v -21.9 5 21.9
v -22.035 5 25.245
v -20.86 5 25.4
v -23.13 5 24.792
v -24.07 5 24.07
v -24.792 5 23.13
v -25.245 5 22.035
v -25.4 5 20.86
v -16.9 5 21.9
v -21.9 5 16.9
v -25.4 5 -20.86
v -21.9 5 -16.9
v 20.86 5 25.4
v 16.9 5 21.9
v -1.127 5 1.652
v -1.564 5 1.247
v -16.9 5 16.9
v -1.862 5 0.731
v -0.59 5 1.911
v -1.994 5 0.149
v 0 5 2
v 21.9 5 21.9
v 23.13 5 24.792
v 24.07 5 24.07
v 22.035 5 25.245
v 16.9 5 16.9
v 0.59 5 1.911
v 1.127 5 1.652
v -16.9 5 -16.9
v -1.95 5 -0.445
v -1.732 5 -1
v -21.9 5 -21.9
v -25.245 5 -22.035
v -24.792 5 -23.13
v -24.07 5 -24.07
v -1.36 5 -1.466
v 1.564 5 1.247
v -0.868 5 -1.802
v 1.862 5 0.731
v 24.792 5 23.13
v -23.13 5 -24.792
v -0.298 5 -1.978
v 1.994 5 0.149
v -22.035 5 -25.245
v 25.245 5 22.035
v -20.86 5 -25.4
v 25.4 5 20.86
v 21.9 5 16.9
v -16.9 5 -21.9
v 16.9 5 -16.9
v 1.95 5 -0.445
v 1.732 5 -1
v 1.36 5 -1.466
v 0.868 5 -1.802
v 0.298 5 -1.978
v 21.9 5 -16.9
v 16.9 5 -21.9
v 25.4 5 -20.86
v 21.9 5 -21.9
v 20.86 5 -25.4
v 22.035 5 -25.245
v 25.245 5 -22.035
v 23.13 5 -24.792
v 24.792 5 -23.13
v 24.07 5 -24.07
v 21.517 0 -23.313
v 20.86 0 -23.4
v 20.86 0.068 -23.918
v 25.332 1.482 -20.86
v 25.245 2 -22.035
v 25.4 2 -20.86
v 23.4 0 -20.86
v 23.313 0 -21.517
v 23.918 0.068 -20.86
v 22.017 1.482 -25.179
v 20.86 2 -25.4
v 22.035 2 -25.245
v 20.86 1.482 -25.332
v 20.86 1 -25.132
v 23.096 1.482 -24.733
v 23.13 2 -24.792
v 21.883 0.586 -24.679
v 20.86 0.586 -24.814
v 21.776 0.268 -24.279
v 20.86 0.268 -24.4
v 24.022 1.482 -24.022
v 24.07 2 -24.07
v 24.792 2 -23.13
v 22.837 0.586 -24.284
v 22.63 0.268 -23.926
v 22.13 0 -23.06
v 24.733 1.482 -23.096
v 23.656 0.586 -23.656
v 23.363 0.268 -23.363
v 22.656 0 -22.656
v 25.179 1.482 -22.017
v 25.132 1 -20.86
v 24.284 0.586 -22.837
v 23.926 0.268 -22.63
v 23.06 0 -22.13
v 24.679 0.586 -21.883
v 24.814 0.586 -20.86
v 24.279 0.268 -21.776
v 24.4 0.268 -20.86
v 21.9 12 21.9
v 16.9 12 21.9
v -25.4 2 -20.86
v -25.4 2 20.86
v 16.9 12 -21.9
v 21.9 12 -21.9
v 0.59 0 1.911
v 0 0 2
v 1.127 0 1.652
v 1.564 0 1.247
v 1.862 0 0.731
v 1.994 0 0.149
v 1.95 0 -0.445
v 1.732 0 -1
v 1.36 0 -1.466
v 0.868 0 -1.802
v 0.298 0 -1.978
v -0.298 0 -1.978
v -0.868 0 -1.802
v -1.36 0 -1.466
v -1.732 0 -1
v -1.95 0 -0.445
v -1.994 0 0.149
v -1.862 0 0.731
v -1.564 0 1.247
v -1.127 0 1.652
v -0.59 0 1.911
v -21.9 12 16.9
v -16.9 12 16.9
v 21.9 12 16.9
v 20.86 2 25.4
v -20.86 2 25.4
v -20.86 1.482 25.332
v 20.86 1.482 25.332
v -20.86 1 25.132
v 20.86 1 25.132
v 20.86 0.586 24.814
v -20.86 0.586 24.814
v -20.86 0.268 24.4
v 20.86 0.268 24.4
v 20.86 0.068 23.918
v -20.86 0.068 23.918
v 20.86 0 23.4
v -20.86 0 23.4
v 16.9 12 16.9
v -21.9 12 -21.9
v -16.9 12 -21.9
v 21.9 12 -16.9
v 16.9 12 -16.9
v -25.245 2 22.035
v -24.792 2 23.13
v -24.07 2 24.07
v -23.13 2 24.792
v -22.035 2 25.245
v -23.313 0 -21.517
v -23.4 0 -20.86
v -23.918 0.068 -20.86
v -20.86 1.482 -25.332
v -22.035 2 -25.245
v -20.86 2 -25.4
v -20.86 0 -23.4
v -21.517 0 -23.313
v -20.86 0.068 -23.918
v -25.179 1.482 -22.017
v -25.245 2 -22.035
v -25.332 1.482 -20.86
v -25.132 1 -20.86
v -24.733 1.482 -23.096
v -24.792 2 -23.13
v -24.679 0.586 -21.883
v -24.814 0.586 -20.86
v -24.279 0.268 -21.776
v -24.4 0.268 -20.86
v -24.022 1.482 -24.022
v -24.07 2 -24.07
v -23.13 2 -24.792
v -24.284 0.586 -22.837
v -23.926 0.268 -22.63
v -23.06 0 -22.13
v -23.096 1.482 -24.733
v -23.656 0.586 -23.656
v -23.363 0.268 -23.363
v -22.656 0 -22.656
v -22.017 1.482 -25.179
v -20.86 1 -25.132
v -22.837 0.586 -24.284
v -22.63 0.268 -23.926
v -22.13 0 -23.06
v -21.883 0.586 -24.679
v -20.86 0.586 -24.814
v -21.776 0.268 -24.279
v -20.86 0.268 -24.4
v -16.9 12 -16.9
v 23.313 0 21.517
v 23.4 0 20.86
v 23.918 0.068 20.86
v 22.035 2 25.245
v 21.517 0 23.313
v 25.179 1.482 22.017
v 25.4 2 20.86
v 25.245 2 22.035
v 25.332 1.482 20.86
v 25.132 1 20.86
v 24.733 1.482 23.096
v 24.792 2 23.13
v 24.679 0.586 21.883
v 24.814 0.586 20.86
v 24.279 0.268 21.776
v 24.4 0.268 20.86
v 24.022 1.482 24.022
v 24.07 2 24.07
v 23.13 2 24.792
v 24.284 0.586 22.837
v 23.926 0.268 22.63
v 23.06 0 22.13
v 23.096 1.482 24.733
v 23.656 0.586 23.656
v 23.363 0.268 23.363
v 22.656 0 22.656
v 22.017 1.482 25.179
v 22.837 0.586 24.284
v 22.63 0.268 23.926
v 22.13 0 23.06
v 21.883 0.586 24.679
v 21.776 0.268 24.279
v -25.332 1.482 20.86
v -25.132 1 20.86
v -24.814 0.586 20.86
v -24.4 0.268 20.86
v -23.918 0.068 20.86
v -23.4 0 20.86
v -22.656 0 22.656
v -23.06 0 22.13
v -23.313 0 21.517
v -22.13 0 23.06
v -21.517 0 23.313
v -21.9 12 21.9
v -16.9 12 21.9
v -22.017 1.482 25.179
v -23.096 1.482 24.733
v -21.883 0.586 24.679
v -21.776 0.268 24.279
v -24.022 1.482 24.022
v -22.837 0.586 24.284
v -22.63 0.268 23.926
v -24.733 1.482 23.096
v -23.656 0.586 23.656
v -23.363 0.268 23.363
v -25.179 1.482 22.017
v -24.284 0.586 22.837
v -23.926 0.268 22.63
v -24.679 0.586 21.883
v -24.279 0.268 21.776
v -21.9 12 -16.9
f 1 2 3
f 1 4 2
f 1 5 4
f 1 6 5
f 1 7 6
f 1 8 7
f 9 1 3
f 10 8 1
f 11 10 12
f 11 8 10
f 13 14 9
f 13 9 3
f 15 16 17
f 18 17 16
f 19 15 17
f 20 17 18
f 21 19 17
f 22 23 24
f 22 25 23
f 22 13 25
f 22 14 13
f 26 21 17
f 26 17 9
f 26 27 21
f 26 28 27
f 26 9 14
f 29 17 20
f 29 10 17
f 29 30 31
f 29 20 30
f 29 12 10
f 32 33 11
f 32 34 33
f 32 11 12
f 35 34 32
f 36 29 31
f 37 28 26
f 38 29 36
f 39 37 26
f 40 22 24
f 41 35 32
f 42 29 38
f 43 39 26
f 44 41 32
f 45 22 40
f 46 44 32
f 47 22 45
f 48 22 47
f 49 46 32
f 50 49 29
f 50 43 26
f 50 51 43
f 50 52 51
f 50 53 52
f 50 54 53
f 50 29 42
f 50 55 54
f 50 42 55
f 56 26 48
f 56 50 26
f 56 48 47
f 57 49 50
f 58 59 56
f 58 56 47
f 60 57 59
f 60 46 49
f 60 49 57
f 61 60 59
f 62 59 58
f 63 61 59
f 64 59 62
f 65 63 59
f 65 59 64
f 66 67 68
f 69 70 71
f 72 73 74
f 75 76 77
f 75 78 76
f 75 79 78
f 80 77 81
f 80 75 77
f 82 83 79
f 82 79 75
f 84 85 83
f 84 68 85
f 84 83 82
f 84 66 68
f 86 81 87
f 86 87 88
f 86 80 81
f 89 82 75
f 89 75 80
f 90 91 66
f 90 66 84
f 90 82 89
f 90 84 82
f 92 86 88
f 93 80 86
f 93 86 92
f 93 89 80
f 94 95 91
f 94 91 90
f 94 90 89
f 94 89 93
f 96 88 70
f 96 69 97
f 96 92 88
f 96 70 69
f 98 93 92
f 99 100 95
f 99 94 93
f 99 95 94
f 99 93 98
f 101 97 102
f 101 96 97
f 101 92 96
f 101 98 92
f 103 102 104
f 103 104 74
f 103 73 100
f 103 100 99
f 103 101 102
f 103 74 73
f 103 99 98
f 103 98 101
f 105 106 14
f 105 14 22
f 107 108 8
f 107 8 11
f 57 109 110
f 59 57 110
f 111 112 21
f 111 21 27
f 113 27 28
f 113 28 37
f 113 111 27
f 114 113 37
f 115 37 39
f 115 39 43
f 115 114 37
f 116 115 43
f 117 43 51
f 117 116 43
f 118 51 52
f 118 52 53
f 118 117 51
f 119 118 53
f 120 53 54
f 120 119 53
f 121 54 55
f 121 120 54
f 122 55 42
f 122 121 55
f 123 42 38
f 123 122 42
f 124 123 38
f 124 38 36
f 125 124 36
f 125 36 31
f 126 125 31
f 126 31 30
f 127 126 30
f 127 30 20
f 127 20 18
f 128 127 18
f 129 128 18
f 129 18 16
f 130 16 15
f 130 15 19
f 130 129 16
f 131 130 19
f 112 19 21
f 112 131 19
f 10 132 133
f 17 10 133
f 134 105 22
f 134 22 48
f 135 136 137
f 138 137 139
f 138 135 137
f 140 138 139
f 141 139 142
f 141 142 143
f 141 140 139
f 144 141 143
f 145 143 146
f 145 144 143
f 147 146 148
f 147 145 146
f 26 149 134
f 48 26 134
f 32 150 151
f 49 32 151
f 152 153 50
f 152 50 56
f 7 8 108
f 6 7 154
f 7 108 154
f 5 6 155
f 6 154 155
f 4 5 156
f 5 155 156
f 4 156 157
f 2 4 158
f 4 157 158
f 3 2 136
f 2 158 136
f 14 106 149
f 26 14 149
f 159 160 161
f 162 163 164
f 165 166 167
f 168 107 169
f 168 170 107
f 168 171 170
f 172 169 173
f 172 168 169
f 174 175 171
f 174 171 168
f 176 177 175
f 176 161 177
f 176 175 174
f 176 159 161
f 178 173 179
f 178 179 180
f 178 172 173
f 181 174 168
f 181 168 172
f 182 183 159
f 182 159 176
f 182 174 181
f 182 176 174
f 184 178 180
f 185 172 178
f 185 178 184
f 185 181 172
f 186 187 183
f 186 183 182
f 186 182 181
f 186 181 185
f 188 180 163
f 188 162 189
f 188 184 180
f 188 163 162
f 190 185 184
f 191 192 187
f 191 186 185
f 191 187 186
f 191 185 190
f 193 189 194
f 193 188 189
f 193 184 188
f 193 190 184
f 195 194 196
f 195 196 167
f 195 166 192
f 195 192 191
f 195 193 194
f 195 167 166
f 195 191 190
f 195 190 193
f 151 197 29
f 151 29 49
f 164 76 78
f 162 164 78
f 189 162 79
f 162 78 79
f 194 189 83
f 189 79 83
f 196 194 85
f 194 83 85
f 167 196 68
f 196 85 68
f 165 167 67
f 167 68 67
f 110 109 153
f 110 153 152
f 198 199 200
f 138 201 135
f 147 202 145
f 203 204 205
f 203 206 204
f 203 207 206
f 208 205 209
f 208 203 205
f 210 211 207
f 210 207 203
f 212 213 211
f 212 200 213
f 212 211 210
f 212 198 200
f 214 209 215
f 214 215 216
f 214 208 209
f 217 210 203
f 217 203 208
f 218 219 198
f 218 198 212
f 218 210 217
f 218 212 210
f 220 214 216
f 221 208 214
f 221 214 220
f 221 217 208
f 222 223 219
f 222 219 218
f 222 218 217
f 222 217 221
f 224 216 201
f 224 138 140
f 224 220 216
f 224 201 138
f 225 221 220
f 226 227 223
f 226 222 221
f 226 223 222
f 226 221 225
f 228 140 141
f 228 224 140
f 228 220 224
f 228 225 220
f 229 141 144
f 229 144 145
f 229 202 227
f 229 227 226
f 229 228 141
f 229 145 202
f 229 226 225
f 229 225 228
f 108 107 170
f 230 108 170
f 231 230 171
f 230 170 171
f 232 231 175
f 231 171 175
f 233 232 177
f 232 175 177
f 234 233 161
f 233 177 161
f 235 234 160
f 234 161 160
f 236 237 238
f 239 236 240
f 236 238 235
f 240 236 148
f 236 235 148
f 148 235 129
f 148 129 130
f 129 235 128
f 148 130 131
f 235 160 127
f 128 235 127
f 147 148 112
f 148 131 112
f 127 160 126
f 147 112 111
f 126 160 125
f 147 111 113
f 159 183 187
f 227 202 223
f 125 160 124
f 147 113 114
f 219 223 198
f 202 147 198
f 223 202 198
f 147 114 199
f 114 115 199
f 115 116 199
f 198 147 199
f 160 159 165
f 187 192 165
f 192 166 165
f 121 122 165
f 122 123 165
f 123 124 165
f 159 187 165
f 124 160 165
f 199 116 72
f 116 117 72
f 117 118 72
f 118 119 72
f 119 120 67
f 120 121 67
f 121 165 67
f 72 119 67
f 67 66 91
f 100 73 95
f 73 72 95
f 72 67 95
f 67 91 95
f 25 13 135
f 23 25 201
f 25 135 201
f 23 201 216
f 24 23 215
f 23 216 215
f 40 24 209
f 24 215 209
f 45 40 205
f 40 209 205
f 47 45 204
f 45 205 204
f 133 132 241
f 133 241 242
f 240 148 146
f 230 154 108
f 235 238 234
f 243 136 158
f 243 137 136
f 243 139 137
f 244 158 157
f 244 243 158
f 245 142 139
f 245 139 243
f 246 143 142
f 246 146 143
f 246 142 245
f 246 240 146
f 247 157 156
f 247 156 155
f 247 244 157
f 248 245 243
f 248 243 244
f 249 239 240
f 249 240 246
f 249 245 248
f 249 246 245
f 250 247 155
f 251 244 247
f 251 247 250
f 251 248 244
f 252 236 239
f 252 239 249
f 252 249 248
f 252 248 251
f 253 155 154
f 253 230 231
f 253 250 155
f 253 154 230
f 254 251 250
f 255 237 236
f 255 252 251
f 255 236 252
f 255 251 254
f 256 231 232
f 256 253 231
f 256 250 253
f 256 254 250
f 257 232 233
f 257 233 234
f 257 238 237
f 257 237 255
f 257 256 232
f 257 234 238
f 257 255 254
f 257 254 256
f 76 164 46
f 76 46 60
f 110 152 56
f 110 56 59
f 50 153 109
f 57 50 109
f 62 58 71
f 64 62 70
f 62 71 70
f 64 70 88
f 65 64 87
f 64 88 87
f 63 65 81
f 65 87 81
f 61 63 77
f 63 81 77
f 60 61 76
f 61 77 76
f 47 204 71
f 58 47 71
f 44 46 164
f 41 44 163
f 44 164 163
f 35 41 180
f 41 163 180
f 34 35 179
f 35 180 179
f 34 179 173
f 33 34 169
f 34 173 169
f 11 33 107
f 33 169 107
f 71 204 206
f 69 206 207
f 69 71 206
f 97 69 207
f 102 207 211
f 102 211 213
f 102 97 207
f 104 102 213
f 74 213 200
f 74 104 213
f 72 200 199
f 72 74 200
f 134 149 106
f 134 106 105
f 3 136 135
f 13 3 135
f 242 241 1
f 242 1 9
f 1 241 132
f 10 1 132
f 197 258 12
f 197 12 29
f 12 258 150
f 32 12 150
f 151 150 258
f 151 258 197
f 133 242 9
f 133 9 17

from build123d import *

# Parameters (mm, degrees)
SKETCH1_W           = 50.8
SKETCH1_H           = 50.8
SKETCH1_R           = 2
SKETCH1_W_2         = 5
SKETCH1_H_2         = 5
BOSS_EXTRUDE1_DEPTH = 5
FILLET1_R           = 2
FILLET2_R           = 4.54
SKETCH1_6_W         = 5
SKETCH1_6_H         = 5
BOSS_EXTRUDE2_DEPTH = 12


with BuildPart() as part:
    # Sketch1 → Boss-Extrude1 (new body)
    with BuildSketch(Plane(origin=(0, 0, 0), x_dir=(1, 0, 0), z_dir=(0, 1, 0))):
        Rectangle(SKETCH1_W, SKETCH1_H)
        with Locations(Location((0, 0, 0), (0, 0, 270))):
            Circle(SKETCH1_R, mode=Mode.SUBTRACT)
        with Locations((-19.4, 19.4)):
            Rectangle(SKETCH1_W_2, SKETCH1_H_2, mode=Mode.SUBTRACT)
        with Locations((19.4, 19.4)):
            Rectangle(SKETCH1_W_2, SKETCH1_H_2, mode=Mode.SUBTRACT)
        with Locations((-19.4, -19.4)):
            Rectangle(SKETCH1_W_2, SKETCH1_H_2, mode=Mode.SUBTRACT)
        with Locations((19.4, -19.4)):
            Rectangle(SKETCH1_W_2, SKETCH1_H_2, mode=Mode.SUBTRACT)
    extrude(amount=BOSS_EXTRUDE1_DEPTH)

    # Fillet1
    fillet1_edges = [part.edges().sort_by_distance(p)[0] for p in [
        (0, 0, 25.4),
        (-25.4, 0, 0),
        (0, 0, -25.4),
        (25.4, 0, 0),
    ]]
    fillet(fillet1_edges, radius=FILLET1_R)

    # Fillet2
    # the kernel refuses this fillet: 4.54 mm, written as the material it takes off along each edge
    with BuildSketch(Plane(origin=(20.86, 0, -20.86), x_dir=(0, 0, -1), z_dir=(-1, 0, 0))) as fillet2_piece_1:
        with BuildLine():
            CenterArc((2.54, -2), 2, 0, 90)
            Line((4.54, -2), (4.54, 0))
            Line((4.54, 0), (2.54, 0))
        make_face()
    revolve(axis=Axis((20.86, 0, -20.86), (0, -1, 0)), revolution_arc=90, mode=Mode.SUBTRACT)
    with BuildSketch(Plane(origin=(20.86, 0, 20.86), x_dir=(1, 0, 0), z_dir=(0, 0, -1))) as fillet2_piece_2:
        with BuildLine():
            CenterArc((2.54, -2), 2, 0, 90)
            Line((4.54, -2), (4.54, 0))
            Line((4.54, 0), (2.54, 0))
        make_face()
    revolve(axis=Axis((20.86, 0, 20.86), (0, -1, 0)), revolution_arc=90, mode=Mode.SUBTRACT)
    with BuildSketch(Plane(origin=(-20.86, 0, -20.86), x_dir=(-1, 0, 0), z_dir=(0, 0, 1))) as fillet2_piece_3:
        with BuildLine():
            CenterArc((2.54, -2), 2, 0, 90)
            Line((4.54, -2), (4.54, 0))
            Line((4.54, 0), (2.54, 0))
        make_face()
    revolve(axis=Axis((-20.86, 0, -20.86), (0, -1, 0)), revolution_arc=90, mode=Mode.SUBTRACT)
    with BuildSketch(Plane(origin=(-20.86, 0, 20.86), x_dir=(0, 0, 1), z_dir=(1, 0, 0))) as fillet2_piece_4:
        with BuildLine():
            CenterArc((2.54, -2), 2, 0, 90)
            Line((4.54, -2), (4.54, 0))
            Line((4.54, 0), (2.54, 0))
        make_face()
    revolve(axis=Axis((-20.86, 0, 20.86), (0, -1, 0)), revolution_arc=90, mode=Mode.SUBTRACT)
    with BuildSketch(Plane(origin=(25.4, 0, 25.4), x_dir=(0, 0, -1), z_dir=(0, 1, 0)), Plane(origin=(25.4, 0, -25.4), x_dir=(-1, 0, 0), z_dir=(0, 1, 0))) as fillet2_piece_5:
        with BuildLine():
            CenterArc((FILLET2_R, FILLET2_R), FILLET2_R, 180, 90)
            Line((0, FILLET2_R), (0, 0))
            Line((0, 0), (FILLET2_R, 0))
        make_face()
    extrude(amount=16.35, mode=Mode.SUBTRACT)
    with BuildSketch(Plane(origin=(-25.4, 0, 25.4), x_dir=(0, 0, -1), z_dir=(0, 1, 0)), Plane(origin=(-25.4, 0, -25.4), x_dir=(1, 0, 0), z_dir=(0, 1, 0))) as fillet2_piece_6:
        with BuildLine():
            CenterArc((FILLET2_R, -FILLET2_R), FILLET2_R, 90, 90)
            Line((0, -FILLET2_R), (0, 0))
            Line((0, 0), (FILLET2_R, 0))
        make_face()
    extrude(amount=16.35, mode=Mode.SUBTRACT)

    # Sketch1<6> → Boss-Extrude2 (add)
    with BuildSketch(Plane(origin=(0, 0, 0), x_dir=(1, 0, 0), z_dir=(0, 1, 0))):
        with Locations((-19.4, -19.4)):
            Rectangle(SKETCH1_6_W, SKETCH1_6_H)
        with Locations((19.4, -19.4)):
            Rectangle(SKETCH1_6_W, SKETCH1_6_H)
        with Locations((19.4, 19.4)):
            Rectangle(SKETCH1_6_W, SKETCH1_6_H)
        with Locations((-19.4, 19.4)):
            Rectangle(SKETCH1_6_W, SKETCH1_6_H)
    extrude(amount=BOSS_EXTRUDE2_DEPTH)


solid = part.part
